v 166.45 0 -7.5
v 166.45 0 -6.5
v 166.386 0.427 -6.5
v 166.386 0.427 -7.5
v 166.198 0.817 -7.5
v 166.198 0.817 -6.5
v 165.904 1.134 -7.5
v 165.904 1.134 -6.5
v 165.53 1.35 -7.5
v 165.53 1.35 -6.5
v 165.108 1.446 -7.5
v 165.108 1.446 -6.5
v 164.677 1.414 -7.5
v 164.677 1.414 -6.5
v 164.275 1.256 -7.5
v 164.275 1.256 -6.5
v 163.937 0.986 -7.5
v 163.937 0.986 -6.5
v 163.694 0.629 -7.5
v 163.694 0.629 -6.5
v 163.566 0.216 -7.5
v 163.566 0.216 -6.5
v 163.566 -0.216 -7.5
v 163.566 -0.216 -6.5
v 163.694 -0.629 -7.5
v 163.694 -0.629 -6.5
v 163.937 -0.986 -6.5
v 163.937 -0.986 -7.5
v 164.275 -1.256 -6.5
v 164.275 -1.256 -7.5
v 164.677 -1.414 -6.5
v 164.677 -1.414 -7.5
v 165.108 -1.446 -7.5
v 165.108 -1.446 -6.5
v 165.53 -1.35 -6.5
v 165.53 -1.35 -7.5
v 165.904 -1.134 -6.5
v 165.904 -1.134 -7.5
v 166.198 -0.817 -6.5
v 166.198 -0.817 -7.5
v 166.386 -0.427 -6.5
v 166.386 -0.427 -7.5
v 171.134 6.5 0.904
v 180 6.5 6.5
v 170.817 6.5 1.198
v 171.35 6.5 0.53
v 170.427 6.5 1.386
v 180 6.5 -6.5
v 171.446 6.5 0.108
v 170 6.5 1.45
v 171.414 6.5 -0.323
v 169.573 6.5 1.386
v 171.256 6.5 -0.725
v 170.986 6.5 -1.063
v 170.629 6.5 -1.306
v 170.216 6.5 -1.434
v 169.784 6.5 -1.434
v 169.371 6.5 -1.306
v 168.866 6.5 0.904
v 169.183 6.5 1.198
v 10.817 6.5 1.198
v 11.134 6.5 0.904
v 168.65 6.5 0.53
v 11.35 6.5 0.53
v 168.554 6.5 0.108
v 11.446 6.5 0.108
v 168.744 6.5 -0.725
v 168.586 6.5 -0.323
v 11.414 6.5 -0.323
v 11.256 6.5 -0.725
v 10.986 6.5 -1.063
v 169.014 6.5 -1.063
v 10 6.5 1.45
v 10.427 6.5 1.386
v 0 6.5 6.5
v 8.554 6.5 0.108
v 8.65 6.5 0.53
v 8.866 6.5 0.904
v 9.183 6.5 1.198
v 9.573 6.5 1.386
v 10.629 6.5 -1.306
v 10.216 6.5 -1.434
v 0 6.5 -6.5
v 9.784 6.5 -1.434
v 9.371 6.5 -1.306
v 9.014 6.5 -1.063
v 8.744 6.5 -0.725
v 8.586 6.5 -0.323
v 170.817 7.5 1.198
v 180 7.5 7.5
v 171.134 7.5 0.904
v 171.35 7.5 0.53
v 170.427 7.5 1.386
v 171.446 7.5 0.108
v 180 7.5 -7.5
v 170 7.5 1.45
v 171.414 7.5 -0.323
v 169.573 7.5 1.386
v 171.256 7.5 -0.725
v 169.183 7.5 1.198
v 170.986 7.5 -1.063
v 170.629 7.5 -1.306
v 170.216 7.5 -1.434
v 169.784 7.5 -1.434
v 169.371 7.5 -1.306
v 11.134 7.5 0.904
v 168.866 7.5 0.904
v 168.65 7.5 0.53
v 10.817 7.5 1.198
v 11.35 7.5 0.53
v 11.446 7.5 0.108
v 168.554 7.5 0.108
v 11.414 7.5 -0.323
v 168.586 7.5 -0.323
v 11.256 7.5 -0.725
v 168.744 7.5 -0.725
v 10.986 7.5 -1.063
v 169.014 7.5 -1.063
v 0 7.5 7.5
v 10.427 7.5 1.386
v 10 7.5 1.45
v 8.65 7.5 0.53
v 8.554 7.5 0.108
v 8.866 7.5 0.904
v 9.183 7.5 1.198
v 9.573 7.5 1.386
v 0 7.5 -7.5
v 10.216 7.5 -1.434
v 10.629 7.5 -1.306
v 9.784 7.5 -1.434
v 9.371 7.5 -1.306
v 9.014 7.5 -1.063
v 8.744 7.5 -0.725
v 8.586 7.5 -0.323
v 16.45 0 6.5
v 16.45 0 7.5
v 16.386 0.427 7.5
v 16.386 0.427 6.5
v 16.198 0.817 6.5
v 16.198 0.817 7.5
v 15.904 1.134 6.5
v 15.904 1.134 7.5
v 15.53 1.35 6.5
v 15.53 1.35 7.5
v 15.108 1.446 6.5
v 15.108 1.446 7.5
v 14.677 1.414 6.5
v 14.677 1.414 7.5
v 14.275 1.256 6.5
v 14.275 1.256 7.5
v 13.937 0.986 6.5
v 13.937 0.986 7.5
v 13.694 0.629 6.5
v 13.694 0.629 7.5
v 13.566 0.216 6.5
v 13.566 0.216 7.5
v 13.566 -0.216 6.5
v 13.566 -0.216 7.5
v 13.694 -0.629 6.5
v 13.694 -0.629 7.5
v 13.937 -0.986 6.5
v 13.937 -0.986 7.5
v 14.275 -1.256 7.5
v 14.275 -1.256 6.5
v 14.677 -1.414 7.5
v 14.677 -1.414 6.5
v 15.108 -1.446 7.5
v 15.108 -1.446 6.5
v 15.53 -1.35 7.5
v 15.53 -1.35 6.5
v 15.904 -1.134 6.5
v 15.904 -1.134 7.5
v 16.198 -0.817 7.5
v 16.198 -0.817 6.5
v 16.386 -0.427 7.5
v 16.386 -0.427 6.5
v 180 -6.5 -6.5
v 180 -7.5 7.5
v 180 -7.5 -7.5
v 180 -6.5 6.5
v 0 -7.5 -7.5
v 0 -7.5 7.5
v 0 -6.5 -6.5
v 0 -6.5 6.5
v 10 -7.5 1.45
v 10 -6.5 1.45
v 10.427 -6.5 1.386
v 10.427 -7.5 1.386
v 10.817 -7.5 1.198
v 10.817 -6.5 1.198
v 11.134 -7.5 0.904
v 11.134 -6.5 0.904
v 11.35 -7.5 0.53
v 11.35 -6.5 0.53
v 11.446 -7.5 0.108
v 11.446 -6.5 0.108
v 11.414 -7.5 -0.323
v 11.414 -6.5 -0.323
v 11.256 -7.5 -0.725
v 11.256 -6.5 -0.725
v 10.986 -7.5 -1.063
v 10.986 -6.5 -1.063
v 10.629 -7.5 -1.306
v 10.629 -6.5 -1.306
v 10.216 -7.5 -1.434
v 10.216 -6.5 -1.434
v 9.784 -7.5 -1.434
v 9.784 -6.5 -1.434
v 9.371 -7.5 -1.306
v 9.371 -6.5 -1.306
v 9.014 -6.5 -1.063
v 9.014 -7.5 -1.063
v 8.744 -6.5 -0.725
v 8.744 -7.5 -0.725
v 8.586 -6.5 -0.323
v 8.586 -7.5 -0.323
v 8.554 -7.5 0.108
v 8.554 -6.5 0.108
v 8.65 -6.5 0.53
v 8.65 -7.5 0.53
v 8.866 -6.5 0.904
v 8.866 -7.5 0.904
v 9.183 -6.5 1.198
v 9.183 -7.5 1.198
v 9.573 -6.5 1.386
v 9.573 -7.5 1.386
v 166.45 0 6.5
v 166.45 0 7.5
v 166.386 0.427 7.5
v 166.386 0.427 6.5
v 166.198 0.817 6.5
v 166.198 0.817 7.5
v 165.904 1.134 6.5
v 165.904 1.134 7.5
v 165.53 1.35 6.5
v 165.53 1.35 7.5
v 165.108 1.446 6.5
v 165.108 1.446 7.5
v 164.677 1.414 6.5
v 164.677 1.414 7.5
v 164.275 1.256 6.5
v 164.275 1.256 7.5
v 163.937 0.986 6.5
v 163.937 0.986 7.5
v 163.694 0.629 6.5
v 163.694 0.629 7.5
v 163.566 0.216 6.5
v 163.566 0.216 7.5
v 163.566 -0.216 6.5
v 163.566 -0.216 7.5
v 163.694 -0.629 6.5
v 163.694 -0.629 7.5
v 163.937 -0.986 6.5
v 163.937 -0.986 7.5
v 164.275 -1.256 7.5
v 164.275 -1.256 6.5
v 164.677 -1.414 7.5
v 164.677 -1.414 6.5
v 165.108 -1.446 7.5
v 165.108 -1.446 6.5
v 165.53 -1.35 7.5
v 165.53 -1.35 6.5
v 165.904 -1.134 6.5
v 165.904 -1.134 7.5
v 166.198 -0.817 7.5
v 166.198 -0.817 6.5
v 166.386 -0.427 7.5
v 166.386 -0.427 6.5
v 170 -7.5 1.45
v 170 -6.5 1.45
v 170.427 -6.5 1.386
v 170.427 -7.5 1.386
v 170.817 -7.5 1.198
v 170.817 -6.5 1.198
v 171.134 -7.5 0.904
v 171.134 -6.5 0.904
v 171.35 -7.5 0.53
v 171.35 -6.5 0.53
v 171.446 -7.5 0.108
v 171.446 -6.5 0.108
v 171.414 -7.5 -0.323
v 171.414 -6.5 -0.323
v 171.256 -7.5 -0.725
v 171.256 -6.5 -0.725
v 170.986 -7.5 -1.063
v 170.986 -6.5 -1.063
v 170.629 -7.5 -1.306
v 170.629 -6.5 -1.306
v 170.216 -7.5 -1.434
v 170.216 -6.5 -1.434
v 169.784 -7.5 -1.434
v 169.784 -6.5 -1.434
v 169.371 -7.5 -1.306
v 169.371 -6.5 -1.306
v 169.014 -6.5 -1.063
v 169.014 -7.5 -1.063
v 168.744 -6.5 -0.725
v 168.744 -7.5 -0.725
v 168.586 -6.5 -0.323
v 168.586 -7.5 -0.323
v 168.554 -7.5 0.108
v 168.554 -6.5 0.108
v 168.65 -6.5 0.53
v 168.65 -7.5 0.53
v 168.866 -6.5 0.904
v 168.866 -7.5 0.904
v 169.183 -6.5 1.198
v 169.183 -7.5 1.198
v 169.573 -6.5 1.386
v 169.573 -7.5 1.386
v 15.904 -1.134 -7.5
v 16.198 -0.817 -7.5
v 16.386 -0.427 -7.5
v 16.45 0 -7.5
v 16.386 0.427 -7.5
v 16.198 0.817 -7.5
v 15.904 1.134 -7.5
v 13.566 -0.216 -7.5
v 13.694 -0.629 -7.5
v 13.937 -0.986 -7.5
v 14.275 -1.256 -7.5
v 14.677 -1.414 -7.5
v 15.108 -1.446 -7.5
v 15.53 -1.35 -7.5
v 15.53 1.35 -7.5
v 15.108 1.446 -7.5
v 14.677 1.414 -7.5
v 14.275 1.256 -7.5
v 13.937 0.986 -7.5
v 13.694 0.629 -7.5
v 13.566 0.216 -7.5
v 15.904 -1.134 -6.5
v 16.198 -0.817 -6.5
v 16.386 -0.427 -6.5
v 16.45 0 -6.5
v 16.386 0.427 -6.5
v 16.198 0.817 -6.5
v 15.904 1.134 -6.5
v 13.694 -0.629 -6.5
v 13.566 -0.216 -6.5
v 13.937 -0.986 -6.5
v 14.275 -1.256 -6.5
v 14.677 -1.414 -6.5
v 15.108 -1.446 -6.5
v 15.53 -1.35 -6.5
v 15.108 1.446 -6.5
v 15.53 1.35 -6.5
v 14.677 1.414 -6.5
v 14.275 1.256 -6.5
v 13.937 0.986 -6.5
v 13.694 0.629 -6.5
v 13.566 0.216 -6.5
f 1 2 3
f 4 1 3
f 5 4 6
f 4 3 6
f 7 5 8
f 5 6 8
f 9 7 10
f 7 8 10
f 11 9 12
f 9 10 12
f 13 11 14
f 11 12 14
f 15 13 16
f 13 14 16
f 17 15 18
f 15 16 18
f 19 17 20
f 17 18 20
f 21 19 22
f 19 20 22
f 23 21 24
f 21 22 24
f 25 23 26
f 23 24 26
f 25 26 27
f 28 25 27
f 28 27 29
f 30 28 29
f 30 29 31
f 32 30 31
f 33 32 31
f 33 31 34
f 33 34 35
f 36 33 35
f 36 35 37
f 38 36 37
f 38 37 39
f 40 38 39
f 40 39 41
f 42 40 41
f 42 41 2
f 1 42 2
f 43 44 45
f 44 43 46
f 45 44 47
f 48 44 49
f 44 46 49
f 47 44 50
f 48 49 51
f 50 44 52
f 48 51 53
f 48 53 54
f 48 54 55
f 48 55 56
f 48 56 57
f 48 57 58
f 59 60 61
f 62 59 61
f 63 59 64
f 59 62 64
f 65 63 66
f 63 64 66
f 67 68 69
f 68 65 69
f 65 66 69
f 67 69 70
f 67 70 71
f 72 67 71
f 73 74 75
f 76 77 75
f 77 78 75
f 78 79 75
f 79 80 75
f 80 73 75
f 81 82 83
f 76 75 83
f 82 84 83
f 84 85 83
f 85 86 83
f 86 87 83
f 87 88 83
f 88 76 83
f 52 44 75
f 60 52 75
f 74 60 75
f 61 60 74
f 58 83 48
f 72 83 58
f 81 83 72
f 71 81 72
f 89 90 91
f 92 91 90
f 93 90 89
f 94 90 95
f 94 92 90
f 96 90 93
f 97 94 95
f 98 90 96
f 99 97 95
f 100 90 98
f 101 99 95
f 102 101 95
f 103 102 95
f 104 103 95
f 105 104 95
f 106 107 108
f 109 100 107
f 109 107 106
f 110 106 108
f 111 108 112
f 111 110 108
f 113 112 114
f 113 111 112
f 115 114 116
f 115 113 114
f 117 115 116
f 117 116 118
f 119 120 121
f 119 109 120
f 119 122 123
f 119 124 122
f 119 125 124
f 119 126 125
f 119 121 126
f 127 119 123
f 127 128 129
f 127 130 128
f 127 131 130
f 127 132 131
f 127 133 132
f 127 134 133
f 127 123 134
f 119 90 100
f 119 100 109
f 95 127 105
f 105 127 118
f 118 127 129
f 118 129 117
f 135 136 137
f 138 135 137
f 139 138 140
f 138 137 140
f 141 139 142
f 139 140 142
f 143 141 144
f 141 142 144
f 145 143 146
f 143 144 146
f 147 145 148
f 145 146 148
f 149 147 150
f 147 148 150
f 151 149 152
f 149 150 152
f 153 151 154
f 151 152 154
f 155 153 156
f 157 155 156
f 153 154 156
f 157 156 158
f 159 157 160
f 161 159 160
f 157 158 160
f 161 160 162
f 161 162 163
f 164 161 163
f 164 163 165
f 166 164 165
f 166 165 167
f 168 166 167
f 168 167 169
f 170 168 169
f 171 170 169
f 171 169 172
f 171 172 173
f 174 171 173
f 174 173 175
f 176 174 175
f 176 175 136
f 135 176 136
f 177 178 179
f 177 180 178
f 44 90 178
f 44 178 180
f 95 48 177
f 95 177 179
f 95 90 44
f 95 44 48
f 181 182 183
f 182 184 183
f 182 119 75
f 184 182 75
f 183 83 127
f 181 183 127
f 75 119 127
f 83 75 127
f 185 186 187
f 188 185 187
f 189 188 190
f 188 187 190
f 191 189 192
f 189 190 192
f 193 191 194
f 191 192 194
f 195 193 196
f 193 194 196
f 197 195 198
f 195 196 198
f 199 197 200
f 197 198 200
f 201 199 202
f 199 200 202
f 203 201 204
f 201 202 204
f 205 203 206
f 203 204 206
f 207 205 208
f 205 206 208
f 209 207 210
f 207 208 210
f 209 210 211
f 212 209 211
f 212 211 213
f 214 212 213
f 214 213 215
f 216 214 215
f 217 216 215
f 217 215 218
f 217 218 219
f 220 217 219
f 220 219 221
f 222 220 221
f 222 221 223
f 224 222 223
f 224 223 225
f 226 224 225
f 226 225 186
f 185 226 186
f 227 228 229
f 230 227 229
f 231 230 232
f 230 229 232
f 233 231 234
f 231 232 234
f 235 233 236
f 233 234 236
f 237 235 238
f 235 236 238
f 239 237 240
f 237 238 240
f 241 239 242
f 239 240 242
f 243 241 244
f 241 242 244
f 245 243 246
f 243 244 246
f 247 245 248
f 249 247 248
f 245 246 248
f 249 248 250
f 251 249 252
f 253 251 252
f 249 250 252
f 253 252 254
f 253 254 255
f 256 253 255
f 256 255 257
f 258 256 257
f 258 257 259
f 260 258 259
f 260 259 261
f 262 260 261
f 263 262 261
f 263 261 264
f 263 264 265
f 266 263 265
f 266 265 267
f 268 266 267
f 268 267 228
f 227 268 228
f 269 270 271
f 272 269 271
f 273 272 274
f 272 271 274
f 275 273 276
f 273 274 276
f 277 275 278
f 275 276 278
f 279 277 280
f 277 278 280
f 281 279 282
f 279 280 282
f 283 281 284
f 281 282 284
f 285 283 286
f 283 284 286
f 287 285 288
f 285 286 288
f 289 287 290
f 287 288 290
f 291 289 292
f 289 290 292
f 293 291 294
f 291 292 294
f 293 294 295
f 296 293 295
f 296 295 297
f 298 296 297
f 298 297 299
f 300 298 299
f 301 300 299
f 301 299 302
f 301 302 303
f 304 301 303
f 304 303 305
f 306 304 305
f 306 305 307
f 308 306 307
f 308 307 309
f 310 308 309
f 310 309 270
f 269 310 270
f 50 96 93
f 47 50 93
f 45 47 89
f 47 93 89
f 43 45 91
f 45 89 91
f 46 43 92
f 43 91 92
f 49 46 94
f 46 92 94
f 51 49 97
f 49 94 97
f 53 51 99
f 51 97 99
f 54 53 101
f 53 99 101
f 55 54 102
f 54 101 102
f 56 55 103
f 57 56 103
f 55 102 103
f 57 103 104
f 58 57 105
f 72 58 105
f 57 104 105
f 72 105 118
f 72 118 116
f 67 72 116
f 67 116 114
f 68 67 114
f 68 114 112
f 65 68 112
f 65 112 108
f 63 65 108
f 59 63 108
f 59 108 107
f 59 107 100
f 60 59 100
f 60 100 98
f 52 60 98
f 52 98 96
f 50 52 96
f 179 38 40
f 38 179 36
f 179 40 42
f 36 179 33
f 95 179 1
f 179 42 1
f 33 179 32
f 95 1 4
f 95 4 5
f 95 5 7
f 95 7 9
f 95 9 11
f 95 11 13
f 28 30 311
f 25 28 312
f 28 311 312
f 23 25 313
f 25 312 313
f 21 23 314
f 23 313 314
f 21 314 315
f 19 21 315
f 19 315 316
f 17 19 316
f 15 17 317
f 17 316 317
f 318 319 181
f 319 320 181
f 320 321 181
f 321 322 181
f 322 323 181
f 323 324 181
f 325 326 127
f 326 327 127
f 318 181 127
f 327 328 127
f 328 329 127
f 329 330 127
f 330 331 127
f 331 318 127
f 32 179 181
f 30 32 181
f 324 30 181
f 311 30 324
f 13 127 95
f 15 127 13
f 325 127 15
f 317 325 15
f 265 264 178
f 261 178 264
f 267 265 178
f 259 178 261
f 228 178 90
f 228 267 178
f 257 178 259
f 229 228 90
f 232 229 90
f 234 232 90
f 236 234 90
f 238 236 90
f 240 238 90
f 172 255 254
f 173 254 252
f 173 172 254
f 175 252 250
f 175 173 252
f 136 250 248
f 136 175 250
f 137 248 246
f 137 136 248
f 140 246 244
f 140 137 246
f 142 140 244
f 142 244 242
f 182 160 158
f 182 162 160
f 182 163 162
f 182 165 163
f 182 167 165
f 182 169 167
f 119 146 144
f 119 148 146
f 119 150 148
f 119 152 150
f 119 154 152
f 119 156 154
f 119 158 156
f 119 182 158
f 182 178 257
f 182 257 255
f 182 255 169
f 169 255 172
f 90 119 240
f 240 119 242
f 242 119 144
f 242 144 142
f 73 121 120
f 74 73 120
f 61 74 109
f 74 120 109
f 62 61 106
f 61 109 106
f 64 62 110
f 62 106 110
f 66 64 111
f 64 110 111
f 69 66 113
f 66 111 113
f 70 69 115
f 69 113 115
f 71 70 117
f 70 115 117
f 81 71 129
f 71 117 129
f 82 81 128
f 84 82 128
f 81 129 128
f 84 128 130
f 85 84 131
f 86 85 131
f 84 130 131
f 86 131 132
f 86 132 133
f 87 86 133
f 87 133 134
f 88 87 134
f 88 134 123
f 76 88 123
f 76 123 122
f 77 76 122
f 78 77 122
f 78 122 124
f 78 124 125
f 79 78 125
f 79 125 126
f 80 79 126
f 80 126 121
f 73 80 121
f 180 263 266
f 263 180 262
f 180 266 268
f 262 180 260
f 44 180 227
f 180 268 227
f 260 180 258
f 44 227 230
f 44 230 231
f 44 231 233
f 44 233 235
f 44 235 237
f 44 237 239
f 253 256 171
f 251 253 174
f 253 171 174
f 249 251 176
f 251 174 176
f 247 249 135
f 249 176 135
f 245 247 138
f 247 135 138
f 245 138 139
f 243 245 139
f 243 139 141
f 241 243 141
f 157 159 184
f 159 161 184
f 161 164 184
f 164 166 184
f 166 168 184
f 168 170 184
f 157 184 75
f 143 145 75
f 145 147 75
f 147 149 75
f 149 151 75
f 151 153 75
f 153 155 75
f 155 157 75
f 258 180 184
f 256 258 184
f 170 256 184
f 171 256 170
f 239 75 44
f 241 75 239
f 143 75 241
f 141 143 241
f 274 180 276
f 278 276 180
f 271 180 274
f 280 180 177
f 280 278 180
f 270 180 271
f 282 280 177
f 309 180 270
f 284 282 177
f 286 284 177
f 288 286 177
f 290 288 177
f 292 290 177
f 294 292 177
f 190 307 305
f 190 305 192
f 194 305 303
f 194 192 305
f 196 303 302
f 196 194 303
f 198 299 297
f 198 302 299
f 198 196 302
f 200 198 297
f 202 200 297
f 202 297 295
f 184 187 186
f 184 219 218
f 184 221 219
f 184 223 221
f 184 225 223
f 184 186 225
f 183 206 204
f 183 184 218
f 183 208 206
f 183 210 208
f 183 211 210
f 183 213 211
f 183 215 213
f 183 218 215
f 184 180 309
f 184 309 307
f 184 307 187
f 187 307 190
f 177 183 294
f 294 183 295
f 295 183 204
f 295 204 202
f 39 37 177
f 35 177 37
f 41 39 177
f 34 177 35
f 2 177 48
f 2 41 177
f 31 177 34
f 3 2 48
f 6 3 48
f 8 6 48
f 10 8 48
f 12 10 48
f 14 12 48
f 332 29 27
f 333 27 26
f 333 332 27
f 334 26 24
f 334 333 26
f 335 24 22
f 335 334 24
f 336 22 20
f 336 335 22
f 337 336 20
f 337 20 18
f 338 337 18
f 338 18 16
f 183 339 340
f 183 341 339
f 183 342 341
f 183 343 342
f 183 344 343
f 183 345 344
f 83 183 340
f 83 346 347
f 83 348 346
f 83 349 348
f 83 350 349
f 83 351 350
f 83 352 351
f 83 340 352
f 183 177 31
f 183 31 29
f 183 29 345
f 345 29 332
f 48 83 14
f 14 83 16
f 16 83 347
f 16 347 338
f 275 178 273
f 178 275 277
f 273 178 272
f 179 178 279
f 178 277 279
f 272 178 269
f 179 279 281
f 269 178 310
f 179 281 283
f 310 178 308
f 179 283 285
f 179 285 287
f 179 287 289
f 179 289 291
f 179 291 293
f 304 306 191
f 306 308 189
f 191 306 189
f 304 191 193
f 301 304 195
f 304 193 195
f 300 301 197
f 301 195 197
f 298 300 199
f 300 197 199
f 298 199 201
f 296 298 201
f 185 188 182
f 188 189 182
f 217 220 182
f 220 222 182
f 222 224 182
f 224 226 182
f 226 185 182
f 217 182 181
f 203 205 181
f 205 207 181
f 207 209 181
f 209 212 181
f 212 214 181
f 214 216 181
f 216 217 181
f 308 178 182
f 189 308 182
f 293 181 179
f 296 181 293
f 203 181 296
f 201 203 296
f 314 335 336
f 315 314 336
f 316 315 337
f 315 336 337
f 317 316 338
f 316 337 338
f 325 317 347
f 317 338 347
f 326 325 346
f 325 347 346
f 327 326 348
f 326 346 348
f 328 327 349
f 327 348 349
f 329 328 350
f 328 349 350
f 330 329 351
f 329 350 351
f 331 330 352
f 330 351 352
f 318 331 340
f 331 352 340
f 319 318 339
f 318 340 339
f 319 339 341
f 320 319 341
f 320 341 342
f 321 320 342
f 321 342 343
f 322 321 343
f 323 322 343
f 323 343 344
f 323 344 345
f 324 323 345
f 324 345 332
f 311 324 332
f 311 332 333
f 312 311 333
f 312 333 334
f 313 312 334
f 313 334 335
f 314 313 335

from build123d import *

# Parameters (mm, degrees)
SKETCH_1_W          = 15
SKETCH_1_H          = 15
SKETCH_1_W_2        = 13
SKETCH_1_H_2        = 13
EXTRUDE_1_DEPTH     = 180
SKETCH_2_R          = 1.45
CUT_EXTRUDE_1_DEPTH = 181.779561898
SKETCH_3_R          = 1.45
CUT_EXTRUDE_2_DEPTH = 181.779561898


with BuildPart() as part:
    # 草图1 → 凸台-拉伸1 (new body)
    with BuildSketch(Plane(origin=(0, 0, 0), x_dir=(0, 0, -1), z_dir=(1, 0, 0))):
        Rectangle(SKETCH_1_W, SKETCH_1_H)
        Rectangle(SKETCH_1_W_2, SKETCH_1_H_2, mode=Mode.SUBTRACT)
    extrude(amount=EXTRUDE_1_DEPTH)

    # 草图2 → 切除-拉伸1 (cut, through all)
    with BuildSketch(Plane(origin=(0, 7.5, 0), x_dir=(1, 0, 0), z_dir=(0, 1, 0))):
        with Locations(Location((10, 0, 0), (0, 0, 270))):
            Circle(SKETCH_2_R)
        with Locations(Location((170, 0, 0), (0, 0, 270))):
            Circle(SKETCH_2_R)
    extrude(amount=-CUT_EXTRUDE_1_DEPTH, mode=Mode.SUBTRACT)

    # 草图3 → 切除-拉伸2 (cut, through all)
    with BuildSketch(Plane.XY.offset(7.5)):
        with Locations((15, 0)):
            Circle(SKETCH_3_R)
        with Locations((165, 0)):
            Circle(SKETCH_3_R)
    extrude(amount=-CUT_EXTRUDE_2_DEPTH, mode=Mode.SUBTRACT)


solid = part.part
